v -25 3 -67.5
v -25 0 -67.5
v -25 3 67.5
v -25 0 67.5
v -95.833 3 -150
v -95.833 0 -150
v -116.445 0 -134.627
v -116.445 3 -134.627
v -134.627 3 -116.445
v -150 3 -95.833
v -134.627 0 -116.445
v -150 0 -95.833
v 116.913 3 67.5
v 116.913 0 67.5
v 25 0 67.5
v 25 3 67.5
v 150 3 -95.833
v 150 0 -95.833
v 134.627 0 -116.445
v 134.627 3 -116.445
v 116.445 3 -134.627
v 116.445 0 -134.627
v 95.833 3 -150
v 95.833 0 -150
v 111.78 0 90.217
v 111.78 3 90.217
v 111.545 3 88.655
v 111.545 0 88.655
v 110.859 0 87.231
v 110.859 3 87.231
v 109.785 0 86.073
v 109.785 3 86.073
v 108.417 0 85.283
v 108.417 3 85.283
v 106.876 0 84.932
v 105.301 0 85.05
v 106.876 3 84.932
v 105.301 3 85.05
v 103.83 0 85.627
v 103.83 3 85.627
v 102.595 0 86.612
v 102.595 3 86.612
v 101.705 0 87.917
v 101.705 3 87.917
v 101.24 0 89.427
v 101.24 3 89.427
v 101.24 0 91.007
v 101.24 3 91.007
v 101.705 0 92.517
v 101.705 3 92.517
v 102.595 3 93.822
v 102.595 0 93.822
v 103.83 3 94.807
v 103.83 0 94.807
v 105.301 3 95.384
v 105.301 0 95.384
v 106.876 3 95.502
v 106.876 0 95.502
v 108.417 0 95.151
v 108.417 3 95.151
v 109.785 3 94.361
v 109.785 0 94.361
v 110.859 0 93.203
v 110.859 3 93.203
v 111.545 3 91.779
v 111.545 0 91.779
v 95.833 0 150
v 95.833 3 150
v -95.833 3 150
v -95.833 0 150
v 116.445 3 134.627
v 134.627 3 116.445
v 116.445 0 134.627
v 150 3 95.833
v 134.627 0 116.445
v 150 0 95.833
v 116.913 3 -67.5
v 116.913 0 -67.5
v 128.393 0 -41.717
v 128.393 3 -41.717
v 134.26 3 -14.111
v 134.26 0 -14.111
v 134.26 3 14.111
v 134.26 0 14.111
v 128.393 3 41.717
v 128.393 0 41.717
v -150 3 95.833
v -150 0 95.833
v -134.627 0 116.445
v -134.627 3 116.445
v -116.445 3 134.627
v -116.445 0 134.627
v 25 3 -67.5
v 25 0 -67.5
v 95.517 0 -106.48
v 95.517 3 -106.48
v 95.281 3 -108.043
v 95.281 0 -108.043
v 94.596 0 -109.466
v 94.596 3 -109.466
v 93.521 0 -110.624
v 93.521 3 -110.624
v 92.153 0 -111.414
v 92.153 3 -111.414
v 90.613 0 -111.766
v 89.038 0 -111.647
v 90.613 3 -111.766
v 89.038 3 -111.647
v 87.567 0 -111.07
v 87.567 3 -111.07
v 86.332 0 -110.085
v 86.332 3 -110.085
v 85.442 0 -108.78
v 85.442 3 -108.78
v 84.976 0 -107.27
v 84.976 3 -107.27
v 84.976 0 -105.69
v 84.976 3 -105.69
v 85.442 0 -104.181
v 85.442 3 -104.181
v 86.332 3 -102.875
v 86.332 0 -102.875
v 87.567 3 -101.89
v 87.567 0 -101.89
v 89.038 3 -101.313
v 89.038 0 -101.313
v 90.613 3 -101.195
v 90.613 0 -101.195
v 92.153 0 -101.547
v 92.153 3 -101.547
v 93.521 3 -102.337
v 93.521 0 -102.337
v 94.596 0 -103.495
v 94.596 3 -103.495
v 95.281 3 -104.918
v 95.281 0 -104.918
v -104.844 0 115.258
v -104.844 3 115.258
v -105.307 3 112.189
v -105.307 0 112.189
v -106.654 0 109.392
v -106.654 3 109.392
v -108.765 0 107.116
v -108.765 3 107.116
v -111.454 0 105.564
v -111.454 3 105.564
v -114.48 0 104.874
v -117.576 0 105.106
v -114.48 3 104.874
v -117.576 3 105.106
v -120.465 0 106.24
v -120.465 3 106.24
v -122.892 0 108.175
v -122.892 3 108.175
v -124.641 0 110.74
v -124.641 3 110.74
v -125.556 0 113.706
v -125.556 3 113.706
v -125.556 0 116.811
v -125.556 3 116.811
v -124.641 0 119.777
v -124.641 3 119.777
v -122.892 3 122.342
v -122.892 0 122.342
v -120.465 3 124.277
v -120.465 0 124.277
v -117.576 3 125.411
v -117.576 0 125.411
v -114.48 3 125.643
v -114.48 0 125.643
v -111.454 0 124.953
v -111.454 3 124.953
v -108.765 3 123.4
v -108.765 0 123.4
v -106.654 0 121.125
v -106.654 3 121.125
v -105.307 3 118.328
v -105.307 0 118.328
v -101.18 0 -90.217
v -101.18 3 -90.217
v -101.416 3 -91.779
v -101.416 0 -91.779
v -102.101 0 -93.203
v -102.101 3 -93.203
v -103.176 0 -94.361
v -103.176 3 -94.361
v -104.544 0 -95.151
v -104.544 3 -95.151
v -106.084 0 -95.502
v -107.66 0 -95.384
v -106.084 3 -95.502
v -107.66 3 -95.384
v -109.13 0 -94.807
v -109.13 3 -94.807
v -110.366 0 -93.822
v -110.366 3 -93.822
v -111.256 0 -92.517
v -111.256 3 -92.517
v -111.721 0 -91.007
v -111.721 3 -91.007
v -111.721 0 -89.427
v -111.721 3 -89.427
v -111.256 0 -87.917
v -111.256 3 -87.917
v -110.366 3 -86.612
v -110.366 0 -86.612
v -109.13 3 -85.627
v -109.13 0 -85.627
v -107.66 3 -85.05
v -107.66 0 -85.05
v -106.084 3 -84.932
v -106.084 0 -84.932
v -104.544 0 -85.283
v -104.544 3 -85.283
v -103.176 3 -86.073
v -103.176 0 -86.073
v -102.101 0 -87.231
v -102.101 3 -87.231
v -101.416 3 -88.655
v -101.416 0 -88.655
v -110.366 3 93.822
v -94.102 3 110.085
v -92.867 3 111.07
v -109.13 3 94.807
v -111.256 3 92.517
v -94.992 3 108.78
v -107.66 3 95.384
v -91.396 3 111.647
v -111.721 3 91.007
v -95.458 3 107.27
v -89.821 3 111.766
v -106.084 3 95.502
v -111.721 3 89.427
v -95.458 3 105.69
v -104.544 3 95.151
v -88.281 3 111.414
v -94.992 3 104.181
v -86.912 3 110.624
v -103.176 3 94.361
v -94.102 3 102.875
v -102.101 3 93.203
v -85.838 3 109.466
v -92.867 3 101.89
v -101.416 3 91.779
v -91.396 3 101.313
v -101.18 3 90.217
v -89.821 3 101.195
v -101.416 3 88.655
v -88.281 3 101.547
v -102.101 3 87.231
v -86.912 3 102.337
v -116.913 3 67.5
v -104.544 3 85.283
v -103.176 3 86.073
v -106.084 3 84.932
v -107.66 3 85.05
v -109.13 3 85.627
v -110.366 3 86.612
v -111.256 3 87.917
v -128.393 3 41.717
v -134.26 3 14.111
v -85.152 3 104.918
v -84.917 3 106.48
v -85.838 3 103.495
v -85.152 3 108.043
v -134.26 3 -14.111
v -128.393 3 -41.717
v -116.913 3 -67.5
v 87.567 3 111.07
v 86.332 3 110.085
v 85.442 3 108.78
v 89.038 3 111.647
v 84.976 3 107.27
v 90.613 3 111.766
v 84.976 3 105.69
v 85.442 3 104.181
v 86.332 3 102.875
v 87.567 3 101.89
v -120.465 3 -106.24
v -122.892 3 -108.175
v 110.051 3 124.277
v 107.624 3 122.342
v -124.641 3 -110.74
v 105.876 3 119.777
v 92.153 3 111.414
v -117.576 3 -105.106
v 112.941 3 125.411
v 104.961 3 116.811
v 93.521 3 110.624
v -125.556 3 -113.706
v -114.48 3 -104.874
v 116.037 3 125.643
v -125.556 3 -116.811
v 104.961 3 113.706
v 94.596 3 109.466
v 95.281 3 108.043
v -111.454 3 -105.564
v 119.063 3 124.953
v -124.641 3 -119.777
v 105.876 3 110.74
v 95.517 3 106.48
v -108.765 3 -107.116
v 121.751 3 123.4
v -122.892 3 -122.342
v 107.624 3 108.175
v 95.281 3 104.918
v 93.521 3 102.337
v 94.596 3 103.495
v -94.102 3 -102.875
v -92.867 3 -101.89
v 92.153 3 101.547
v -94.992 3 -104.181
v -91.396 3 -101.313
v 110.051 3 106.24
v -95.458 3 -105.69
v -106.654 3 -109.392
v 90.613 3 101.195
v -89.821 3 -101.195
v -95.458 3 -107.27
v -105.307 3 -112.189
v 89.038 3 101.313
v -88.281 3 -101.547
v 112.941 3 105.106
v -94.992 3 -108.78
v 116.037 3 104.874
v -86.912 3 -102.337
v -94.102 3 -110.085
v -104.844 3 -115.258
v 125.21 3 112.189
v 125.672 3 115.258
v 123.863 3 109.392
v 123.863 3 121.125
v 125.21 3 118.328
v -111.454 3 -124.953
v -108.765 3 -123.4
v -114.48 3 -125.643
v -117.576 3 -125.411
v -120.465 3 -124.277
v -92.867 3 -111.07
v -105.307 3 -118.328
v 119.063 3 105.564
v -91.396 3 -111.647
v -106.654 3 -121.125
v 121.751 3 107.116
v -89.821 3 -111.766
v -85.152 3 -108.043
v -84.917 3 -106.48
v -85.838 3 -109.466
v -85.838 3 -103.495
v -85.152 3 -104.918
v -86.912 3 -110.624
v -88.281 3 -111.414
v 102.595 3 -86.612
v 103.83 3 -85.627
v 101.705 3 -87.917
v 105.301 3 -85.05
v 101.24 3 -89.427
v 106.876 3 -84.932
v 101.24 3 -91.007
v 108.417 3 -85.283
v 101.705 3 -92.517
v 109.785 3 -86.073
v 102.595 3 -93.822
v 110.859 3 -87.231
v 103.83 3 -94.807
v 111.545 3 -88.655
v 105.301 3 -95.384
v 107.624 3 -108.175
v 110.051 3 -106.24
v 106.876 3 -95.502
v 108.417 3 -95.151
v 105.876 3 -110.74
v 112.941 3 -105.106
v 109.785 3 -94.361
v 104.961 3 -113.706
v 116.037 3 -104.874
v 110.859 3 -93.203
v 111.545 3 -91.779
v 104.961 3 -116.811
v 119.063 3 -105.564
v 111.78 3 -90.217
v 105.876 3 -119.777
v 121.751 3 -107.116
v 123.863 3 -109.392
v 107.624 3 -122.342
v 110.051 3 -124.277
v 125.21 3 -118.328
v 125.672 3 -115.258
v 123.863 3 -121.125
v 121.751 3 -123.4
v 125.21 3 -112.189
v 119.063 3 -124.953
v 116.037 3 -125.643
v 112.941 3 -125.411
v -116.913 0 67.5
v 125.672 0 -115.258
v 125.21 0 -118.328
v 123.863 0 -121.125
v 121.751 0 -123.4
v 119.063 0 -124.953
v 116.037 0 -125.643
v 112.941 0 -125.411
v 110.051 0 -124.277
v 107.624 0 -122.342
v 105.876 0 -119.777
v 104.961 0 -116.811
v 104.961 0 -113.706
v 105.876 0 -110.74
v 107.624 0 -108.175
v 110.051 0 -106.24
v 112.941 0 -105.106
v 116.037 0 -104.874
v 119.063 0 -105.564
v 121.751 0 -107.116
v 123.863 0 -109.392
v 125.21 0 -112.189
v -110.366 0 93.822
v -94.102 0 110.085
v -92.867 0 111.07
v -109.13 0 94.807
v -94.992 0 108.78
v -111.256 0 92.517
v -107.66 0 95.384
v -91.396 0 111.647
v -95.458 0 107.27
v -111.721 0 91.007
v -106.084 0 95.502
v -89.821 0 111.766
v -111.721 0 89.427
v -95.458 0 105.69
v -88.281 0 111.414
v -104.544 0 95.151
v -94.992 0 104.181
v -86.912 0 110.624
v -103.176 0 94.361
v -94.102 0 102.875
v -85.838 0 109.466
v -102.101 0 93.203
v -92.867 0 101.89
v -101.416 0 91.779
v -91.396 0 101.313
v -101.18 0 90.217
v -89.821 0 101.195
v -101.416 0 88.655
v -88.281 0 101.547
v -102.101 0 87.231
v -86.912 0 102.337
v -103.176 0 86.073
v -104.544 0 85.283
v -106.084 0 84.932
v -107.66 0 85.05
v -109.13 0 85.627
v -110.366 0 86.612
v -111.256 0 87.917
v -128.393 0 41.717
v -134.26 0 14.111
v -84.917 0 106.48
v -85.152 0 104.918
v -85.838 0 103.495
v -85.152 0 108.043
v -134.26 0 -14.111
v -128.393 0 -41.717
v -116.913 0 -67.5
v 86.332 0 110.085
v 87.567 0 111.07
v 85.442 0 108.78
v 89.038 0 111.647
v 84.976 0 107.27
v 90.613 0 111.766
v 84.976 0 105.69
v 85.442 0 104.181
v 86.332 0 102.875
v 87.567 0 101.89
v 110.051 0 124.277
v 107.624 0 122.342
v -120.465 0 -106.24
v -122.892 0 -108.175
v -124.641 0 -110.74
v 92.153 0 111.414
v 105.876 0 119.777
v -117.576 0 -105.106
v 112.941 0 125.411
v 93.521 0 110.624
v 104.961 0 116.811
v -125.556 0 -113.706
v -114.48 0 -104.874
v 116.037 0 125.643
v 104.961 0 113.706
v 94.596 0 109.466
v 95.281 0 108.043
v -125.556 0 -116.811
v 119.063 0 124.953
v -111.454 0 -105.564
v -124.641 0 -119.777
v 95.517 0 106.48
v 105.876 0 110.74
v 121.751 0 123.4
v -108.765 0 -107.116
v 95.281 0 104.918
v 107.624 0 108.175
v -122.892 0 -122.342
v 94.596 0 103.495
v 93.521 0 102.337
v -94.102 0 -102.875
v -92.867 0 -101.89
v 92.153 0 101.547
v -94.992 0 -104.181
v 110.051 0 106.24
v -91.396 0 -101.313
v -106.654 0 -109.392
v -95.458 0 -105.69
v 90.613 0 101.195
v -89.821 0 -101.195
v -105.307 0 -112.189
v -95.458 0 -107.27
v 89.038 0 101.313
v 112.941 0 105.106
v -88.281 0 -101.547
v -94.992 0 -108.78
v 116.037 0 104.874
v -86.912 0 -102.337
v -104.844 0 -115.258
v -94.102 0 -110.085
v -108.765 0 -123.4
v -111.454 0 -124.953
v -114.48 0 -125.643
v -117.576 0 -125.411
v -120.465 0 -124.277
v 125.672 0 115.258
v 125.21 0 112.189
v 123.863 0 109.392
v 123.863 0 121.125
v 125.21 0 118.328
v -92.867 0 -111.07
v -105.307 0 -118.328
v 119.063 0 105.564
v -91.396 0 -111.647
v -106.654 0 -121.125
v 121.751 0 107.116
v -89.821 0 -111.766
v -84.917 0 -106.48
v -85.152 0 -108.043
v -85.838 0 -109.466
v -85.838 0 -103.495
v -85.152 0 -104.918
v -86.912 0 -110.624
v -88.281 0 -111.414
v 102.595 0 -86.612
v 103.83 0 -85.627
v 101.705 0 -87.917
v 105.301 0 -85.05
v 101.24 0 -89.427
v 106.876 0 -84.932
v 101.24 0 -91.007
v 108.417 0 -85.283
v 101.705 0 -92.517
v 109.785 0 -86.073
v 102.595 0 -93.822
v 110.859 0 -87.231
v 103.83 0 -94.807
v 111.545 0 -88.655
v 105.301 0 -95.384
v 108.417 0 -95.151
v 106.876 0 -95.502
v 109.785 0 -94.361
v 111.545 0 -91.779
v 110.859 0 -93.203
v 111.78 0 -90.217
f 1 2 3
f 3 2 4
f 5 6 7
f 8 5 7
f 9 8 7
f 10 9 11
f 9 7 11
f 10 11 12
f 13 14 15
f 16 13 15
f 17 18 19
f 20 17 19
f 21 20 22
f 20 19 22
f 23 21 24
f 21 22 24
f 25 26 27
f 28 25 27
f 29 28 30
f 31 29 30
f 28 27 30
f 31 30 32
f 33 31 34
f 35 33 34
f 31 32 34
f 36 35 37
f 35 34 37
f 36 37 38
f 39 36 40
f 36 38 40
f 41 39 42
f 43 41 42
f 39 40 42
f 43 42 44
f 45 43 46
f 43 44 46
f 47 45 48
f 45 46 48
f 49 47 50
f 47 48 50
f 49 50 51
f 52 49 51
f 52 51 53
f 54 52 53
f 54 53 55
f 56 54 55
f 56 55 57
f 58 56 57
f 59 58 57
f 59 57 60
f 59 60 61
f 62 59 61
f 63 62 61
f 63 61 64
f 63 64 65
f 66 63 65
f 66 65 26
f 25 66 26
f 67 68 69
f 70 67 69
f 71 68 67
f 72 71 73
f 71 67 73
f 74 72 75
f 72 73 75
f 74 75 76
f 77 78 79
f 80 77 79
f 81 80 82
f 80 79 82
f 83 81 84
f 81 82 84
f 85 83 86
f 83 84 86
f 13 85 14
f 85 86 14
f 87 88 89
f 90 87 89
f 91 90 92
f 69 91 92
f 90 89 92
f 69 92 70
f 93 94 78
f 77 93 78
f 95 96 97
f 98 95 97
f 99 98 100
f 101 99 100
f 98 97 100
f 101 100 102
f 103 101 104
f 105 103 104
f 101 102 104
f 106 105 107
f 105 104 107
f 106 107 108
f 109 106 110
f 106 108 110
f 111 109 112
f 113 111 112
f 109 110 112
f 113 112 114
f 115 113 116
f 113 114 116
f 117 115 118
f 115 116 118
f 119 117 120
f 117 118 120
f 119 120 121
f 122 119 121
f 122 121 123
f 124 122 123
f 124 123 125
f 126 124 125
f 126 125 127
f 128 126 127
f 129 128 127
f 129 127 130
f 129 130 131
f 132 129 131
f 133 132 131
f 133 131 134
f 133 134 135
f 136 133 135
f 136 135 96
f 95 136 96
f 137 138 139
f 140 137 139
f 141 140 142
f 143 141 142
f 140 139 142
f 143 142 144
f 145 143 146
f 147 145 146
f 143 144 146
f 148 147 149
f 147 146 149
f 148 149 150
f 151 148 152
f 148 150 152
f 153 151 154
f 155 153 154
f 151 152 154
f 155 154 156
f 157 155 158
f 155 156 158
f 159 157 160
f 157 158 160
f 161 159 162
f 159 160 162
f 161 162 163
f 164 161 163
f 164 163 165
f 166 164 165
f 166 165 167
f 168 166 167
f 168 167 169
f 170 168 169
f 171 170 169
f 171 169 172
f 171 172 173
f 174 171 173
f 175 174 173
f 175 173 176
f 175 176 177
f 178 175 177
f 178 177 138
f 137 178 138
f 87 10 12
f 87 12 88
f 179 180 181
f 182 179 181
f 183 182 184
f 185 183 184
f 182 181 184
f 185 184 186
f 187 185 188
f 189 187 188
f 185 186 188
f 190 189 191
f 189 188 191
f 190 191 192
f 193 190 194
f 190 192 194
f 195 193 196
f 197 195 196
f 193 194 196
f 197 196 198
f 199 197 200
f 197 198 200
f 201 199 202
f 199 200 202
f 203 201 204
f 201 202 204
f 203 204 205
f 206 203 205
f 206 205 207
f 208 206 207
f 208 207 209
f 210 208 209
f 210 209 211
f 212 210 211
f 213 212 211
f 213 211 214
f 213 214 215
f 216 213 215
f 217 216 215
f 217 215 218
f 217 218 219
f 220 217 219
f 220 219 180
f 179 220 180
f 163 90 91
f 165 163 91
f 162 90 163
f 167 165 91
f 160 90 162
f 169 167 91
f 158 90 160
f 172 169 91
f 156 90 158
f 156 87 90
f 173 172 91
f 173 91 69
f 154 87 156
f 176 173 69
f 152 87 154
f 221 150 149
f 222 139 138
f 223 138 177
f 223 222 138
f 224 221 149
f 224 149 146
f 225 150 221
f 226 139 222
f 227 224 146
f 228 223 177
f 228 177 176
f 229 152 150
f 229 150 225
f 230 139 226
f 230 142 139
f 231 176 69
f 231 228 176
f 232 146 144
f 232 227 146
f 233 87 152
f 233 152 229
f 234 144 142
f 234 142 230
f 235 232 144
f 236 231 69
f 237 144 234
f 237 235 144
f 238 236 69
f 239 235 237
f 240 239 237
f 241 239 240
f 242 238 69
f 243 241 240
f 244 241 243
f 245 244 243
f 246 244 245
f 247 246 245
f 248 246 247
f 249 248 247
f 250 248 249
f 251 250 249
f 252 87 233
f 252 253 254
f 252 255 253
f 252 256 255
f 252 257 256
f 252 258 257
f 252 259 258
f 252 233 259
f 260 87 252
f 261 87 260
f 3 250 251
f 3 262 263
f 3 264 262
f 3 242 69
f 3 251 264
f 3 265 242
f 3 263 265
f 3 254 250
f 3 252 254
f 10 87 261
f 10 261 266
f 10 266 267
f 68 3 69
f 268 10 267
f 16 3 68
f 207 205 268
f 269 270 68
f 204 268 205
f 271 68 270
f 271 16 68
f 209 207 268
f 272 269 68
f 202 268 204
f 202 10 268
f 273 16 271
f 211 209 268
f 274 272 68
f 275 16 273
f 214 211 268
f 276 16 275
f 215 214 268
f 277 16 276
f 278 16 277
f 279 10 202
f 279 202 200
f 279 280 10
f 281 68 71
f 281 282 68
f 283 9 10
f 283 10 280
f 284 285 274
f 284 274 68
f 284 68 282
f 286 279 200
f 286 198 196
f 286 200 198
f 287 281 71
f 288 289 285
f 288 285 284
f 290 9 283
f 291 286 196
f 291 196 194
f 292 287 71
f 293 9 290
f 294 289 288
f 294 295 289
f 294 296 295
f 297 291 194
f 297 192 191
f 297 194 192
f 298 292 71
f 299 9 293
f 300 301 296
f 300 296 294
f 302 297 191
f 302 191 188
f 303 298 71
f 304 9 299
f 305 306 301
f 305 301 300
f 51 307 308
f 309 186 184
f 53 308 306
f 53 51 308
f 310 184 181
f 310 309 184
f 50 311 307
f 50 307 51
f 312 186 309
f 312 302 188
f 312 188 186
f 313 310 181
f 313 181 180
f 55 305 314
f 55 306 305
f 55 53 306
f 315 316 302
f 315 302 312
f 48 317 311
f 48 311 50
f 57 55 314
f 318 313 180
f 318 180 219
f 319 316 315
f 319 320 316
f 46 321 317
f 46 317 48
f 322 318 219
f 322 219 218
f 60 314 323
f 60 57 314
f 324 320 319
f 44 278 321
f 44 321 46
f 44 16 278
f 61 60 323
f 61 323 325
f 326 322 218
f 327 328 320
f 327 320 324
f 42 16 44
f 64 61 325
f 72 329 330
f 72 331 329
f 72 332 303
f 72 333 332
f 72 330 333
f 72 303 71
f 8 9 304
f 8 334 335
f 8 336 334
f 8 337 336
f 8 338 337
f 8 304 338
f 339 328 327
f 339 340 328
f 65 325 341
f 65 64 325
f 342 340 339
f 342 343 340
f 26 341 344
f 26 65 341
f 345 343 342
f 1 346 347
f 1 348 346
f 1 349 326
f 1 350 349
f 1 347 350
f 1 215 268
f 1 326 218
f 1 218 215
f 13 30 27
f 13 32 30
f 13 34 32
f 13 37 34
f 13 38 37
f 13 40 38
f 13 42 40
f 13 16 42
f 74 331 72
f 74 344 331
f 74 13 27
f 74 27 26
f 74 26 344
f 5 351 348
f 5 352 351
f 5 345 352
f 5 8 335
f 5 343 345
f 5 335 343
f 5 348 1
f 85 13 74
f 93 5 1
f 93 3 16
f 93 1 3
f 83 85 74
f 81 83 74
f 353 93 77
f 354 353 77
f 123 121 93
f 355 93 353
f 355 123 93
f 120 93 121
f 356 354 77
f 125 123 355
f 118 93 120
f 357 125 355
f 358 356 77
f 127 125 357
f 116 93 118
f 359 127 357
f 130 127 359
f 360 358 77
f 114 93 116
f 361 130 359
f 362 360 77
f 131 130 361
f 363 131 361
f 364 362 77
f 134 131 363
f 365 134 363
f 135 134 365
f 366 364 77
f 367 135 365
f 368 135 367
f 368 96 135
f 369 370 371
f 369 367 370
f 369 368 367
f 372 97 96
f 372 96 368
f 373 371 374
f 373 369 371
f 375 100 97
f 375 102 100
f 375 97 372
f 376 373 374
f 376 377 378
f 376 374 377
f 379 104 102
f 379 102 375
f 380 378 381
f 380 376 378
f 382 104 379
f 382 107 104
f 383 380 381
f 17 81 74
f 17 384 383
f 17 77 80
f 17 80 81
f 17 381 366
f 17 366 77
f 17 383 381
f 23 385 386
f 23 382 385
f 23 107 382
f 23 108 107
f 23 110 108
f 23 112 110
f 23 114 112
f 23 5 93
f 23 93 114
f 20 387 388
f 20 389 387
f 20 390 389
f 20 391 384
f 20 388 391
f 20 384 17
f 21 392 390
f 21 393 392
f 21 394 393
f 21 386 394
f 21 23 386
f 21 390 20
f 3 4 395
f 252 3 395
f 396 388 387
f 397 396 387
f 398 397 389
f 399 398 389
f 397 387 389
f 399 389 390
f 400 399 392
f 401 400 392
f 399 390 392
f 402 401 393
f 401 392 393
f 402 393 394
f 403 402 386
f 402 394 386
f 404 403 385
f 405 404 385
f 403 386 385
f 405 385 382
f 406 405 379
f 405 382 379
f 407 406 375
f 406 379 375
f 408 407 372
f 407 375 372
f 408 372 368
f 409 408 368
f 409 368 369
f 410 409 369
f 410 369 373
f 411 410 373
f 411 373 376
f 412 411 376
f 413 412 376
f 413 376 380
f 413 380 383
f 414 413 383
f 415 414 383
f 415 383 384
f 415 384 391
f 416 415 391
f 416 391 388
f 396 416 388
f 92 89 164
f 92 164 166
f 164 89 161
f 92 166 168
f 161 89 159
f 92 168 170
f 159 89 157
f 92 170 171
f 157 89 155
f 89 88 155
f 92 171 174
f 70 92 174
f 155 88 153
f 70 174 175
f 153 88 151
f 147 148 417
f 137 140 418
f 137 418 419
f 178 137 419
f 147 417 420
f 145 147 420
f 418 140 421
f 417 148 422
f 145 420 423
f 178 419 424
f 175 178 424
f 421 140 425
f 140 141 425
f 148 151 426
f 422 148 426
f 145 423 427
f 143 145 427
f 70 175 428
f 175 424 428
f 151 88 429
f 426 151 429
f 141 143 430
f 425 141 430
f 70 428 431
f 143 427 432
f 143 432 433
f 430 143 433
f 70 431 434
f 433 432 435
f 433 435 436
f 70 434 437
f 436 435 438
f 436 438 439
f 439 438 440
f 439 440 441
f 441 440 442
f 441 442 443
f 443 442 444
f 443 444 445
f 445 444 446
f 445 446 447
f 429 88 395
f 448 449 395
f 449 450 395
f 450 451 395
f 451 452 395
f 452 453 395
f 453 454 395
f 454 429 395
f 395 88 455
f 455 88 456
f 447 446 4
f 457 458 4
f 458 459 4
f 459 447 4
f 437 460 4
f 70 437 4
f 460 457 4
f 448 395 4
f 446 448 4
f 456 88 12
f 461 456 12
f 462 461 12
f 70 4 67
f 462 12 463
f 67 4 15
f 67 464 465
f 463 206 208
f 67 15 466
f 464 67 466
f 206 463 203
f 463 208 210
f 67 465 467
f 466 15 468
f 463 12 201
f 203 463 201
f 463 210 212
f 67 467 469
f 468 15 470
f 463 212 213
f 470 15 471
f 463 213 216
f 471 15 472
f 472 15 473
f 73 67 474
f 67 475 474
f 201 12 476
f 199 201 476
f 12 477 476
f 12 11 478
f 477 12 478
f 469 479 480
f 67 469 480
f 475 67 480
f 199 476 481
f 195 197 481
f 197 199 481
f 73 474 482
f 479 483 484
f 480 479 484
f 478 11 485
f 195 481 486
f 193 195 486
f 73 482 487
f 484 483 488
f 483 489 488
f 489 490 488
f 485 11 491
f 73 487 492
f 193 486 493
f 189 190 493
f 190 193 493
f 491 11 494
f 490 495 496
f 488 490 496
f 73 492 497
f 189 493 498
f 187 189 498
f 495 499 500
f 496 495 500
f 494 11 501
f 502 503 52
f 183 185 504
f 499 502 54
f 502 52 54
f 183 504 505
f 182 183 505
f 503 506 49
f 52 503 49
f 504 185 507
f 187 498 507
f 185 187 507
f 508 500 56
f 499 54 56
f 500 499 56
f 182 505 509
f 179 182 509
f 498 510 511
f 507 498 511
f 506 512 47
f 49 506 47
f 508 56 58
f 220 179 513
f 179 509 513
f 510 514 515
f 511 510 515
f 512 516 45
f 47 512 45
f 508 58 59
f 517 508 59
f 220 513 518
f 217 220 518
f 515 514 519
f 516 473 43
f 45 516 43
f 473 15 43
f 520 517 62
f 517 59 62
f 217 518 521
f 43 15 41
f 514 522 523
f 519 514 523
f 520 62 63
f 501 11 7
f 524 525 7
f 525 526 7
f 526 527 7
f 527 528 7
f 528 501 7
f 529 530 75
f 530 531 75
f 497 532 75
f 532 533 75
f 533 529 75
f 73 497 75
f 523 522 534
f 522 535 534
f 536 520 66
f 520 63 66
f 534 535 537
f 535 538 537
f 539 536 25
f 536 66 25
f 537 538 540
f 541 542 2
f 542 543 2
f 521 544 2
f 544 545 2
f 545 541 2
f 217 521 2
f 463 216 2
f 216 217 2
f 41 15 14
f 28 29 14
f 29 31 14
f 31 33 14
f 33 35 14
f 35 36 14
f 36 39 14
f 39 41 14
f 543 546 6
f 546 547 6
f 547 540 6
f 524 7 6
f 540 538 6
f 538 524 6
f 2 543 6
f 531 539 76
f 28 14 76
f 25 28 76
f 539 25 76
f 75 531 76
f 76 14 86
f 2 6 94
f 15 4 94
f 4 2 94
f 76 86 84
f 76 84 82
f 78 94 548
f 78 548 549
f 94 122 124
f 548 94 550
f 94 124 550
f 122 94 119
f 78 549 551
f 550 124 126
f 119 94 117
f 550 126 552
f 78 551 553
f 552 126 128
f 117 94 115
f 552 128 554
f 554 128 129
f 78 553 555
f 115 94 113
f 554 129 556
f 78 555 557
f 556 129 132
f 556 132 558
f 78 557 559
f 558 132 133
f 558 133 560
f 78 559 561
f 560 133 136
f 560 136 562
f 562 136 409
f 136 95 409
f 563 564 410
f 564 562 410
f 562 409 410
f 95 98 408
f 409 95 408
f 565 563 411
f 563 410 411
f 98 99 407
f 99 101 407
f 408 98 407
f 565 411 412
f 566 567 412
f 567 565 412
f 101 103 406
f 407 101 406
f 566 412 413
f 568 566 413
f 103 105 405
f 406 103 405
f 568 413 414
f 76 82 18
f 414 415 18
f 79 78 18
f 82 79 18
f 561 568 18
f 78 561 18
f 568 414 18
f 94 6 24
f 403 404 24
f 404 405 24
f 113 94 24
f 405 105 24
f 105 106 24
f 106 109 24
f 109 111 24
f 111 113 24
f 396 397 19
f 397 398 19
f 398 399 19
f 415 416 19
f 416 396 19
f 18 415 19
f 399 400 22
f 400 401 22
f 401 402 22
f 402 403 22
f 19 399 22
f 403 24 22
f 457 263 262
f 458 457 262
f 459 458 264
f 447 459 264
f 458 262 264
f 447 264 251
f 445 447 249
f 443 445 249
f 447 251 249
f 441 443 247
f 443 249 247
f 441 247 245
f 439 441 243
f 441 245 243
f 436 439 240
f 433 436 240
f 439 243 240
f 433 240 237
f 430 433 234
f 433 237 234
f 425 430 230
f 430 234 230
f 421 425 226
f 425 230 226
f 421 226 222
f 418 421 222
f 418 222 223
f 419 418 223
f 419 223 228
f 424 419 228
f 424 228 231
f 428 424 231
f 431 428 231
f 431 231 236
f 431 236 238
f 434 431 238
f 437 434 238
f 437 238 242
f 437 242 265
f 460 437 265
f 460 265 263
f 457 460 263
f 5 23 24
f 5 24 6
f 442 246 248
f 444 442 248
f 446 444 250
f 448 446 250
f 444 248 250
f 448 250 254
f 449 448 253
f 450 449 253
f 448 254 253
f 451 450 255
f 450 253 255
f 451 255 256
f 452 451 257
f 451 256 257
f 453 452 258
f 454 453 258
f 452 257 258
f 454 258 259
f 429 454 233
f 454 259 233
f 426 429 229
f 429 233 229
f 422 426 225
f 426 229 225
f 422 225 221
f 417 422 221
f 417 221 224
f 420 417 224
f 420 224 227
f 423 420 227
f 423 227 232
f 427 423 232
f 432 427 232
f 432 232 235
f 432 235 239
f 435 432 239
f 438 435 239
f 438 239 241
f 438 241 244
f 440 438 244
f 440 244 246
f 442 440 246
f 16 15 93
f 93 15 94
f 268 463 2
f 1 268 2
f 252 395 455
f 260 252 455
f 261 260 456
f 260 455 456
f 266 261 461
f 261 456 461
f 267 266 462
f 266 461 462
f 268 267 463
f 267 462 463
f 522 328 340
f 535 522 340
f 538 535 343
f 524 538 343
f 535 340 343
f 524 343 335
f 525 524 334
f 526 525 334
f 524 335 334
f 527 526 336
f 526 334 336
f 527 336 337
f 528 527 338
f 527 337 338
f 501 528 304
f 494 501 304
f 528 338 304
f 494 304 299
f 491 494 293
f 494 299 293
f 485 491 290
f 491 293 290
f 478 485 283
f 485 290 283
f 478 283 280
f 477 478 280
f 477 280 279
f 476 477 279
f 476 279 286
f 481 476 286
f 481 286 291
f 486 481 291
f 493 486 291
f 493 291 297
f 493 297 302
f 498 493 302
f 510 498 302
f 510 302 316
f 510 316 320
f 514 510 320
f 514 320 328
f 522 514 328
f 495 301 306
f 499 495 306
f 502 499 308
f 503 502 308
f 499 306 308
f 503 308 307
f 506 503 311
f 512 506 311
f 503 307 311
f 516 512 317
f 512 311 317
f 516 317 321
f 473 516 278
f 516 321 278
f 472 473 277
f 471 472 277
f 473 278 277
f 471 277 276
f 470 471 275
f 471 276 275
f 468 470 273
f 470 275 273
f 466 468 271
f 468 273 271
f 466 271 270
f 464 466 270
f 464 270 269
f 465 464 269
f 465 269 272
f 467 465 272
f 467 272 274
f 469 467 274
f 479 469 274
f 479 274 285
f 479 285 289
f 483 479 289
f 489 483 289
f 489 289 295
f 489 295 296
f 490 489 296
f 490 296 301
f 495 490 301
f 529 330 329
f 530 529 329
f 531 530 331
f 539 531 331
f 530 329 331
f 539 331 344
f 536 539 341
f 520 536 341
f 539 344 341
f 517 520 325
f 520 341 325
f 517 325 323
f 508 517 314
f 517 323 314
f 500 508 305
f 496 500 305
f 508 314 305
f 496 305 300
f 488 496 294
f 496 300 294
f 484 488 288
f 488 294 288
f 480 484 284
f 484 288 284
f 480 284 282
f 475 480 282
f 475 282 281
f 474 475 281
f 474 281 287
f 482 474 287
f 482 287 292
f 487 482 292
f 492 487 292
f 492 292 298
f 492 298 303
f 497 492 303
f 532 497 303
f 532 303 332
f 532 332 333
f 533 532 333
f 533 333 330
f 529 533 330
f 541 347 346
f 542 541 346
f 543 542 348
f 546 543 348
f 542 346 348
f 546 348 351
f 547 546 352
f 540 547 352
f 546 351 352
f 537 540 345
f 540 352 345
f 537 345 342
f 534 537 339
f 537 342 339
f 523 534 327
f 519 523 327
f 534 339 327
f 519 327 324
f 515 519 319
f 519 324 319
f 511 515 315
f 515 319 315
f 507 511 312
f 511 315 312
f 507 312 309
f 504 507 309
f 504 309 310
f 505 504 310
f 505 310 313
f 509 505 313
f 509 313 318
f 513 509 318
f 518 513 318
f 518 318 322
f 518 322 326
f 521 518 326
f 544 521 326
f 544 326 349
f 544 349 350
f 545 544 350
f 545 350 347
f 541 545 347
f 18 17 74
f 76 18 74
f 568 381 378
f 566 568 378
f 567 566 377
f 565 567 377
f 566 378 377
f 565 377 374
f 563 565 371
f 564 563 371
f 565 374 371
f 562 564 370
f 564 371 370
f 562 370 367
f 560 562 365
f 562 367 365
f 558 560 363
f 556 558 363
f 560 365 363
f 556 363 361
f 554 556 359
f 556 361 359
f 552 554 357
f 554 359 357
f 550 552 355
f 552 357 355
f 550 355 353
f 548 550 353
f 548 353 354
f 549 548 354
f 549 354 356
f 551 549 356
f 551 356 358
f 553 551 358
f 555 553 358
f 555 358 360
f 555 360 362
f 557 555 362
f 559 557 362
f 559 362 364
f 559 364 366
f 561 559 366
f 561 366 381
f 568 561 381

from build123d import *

# Parameters (mm, degrees)
SKETCH_3_R          = 178
EXTRUDE_3_DEPTH     = 3
SKETCH_4_R          = 10.414
SKETCH_4_R_2        = 5.3
CUT_EXTRUDE_1_DEPTH = 10
CUT_EXTRUDE_2_DEPTH = 10


with BuildPart() as part:
    # 草图3 → 凸台-拉伸3 (new body)
    with BuildSketch(Plane(origin=(0, 0, 0), x_dir=(1, 0, 0), z_dir=(0, 1, 0))):
        Circle(SKETCH_3_R)
        with BuildLine():
            Line((-25, 33.75), (-25, -67.5))
            Line((-25, -67.5), (-116.913429511, -67.5))
            ThreePointArc((-116.913429511, -67.5), (-135, 0), (-116.913429511, 67.5))
            Line((-116.913429511, 67.5), (-25, 67.5))
            Line((-25, 67.5), (-25, 33.75))
        make_face(mode=Mode.SUBTRACT)
        with BuildLine():
            Line((25, 33.75), (25, 67.5))
            Line((25, 67.5), (116.913429511, 67.5))
            ThreePointArc((116.913429511, 67.5), (135, 0), (116.913429511, -67.5))
            Line((116.913429511, -67.5), (25, -67.5))
            Line((25, -67.5), (25, 33.75))
        make_face(mode=Mode.SUBTRACT)
    extrude(amount=EXTRUDE_3_DEPTH)

    # 草图4 → 切除-拉伸1 (cut)
    with BuildSketch(Plane(origin=(0, 3, 0), x_dir=(1, 0, 0), z_dir=(0, 1, 0))):
        with Locations((115.258405333, 115.258405333)):
            Circle(SKETCH_4_R)
        with Locations((115.258405333, -115.258405333)):
            Circle(SKETCH_4_R)
        with Locations((-115.258405333, -115.258405333)):
            Circle(SKETCH_4_R)
        with Locations((-115.258405333, 115.258405333)):
            Circle(SKETCH_4_R)
        with Locations((-90.216925784, -106.480381752)):
            Circle(SKETCH_4_R_2)
        with Locations((-106.480381752, -90.216925784)):
            Circle(SKETCH_4_R_2)
        with Locations((-106.480381752, 90.216925784)):
            Circle(SKETCH_4_R_2)
        with Locations((-90.216925784, 106.480381752)):
            Circle(SKETCH_4_R_2)
        with Locations((90.216925784, 106.480381752)):
            Circle(SKETCH_4_R_2)
        with Locations((106.480381752, 90.216925784)):
            Circle(SKETCH_4_R_2)
        with Locations((106.480381752, -90.216925784)):
            Circle(SKETCH_4_R_2)
        with Locations((90.216925784, -106.480381752)):
            Circle(SKETCH_4_R_2)
    extrude(amount=-CUT_EXTRUDE_1_DEPTH, mode=Mode.SUBTRACT)

    # 草图5 → 切除-拉伸2 (cut)
    with BuildSketch(Plane(origin=(0, 3, 0), x_dir=(1, 0, 0), z_dir=(0, 1, 0))):
        with BuildLine():
            Line((95.833188406, 150), (0, 150))
            Line((0, 150), (-95.833188406, 150))
            ThreePointArc((-95.833188406, 150), (0, 178), (95.833188406, 150))
        make_face()
        with BuildLine():
            Line((150, 95.833188406), (150, 0))
            Line((150, 0), (150, -95.833188406))
            ThreePointArc((150, -95.833188406), (178, 0), (150, 95.833188406))
        make_face()
        with BuildLine():
            Line((95.833188406, -150), (0, -150))
            Line((0, -150), (-95.833188406, -150))
            ThreePointArc((-95.833188406, -150), (0, -178), (95.833188406, -150))
        make_face()
        with BuildLine():
            Line((-150, 0), (-150, -95.833188406))
            ThreePointArc((-150, -95.833188406), (-178, 0), (-150, 95.833188406))
            Line((-150, 95.833188406), (-150, 0))
        make_face()
    extrude(amount=-CUT_EXTRUDE_2_DEPTH, mode=Mode.SUBTRACT)


solid = part.part
